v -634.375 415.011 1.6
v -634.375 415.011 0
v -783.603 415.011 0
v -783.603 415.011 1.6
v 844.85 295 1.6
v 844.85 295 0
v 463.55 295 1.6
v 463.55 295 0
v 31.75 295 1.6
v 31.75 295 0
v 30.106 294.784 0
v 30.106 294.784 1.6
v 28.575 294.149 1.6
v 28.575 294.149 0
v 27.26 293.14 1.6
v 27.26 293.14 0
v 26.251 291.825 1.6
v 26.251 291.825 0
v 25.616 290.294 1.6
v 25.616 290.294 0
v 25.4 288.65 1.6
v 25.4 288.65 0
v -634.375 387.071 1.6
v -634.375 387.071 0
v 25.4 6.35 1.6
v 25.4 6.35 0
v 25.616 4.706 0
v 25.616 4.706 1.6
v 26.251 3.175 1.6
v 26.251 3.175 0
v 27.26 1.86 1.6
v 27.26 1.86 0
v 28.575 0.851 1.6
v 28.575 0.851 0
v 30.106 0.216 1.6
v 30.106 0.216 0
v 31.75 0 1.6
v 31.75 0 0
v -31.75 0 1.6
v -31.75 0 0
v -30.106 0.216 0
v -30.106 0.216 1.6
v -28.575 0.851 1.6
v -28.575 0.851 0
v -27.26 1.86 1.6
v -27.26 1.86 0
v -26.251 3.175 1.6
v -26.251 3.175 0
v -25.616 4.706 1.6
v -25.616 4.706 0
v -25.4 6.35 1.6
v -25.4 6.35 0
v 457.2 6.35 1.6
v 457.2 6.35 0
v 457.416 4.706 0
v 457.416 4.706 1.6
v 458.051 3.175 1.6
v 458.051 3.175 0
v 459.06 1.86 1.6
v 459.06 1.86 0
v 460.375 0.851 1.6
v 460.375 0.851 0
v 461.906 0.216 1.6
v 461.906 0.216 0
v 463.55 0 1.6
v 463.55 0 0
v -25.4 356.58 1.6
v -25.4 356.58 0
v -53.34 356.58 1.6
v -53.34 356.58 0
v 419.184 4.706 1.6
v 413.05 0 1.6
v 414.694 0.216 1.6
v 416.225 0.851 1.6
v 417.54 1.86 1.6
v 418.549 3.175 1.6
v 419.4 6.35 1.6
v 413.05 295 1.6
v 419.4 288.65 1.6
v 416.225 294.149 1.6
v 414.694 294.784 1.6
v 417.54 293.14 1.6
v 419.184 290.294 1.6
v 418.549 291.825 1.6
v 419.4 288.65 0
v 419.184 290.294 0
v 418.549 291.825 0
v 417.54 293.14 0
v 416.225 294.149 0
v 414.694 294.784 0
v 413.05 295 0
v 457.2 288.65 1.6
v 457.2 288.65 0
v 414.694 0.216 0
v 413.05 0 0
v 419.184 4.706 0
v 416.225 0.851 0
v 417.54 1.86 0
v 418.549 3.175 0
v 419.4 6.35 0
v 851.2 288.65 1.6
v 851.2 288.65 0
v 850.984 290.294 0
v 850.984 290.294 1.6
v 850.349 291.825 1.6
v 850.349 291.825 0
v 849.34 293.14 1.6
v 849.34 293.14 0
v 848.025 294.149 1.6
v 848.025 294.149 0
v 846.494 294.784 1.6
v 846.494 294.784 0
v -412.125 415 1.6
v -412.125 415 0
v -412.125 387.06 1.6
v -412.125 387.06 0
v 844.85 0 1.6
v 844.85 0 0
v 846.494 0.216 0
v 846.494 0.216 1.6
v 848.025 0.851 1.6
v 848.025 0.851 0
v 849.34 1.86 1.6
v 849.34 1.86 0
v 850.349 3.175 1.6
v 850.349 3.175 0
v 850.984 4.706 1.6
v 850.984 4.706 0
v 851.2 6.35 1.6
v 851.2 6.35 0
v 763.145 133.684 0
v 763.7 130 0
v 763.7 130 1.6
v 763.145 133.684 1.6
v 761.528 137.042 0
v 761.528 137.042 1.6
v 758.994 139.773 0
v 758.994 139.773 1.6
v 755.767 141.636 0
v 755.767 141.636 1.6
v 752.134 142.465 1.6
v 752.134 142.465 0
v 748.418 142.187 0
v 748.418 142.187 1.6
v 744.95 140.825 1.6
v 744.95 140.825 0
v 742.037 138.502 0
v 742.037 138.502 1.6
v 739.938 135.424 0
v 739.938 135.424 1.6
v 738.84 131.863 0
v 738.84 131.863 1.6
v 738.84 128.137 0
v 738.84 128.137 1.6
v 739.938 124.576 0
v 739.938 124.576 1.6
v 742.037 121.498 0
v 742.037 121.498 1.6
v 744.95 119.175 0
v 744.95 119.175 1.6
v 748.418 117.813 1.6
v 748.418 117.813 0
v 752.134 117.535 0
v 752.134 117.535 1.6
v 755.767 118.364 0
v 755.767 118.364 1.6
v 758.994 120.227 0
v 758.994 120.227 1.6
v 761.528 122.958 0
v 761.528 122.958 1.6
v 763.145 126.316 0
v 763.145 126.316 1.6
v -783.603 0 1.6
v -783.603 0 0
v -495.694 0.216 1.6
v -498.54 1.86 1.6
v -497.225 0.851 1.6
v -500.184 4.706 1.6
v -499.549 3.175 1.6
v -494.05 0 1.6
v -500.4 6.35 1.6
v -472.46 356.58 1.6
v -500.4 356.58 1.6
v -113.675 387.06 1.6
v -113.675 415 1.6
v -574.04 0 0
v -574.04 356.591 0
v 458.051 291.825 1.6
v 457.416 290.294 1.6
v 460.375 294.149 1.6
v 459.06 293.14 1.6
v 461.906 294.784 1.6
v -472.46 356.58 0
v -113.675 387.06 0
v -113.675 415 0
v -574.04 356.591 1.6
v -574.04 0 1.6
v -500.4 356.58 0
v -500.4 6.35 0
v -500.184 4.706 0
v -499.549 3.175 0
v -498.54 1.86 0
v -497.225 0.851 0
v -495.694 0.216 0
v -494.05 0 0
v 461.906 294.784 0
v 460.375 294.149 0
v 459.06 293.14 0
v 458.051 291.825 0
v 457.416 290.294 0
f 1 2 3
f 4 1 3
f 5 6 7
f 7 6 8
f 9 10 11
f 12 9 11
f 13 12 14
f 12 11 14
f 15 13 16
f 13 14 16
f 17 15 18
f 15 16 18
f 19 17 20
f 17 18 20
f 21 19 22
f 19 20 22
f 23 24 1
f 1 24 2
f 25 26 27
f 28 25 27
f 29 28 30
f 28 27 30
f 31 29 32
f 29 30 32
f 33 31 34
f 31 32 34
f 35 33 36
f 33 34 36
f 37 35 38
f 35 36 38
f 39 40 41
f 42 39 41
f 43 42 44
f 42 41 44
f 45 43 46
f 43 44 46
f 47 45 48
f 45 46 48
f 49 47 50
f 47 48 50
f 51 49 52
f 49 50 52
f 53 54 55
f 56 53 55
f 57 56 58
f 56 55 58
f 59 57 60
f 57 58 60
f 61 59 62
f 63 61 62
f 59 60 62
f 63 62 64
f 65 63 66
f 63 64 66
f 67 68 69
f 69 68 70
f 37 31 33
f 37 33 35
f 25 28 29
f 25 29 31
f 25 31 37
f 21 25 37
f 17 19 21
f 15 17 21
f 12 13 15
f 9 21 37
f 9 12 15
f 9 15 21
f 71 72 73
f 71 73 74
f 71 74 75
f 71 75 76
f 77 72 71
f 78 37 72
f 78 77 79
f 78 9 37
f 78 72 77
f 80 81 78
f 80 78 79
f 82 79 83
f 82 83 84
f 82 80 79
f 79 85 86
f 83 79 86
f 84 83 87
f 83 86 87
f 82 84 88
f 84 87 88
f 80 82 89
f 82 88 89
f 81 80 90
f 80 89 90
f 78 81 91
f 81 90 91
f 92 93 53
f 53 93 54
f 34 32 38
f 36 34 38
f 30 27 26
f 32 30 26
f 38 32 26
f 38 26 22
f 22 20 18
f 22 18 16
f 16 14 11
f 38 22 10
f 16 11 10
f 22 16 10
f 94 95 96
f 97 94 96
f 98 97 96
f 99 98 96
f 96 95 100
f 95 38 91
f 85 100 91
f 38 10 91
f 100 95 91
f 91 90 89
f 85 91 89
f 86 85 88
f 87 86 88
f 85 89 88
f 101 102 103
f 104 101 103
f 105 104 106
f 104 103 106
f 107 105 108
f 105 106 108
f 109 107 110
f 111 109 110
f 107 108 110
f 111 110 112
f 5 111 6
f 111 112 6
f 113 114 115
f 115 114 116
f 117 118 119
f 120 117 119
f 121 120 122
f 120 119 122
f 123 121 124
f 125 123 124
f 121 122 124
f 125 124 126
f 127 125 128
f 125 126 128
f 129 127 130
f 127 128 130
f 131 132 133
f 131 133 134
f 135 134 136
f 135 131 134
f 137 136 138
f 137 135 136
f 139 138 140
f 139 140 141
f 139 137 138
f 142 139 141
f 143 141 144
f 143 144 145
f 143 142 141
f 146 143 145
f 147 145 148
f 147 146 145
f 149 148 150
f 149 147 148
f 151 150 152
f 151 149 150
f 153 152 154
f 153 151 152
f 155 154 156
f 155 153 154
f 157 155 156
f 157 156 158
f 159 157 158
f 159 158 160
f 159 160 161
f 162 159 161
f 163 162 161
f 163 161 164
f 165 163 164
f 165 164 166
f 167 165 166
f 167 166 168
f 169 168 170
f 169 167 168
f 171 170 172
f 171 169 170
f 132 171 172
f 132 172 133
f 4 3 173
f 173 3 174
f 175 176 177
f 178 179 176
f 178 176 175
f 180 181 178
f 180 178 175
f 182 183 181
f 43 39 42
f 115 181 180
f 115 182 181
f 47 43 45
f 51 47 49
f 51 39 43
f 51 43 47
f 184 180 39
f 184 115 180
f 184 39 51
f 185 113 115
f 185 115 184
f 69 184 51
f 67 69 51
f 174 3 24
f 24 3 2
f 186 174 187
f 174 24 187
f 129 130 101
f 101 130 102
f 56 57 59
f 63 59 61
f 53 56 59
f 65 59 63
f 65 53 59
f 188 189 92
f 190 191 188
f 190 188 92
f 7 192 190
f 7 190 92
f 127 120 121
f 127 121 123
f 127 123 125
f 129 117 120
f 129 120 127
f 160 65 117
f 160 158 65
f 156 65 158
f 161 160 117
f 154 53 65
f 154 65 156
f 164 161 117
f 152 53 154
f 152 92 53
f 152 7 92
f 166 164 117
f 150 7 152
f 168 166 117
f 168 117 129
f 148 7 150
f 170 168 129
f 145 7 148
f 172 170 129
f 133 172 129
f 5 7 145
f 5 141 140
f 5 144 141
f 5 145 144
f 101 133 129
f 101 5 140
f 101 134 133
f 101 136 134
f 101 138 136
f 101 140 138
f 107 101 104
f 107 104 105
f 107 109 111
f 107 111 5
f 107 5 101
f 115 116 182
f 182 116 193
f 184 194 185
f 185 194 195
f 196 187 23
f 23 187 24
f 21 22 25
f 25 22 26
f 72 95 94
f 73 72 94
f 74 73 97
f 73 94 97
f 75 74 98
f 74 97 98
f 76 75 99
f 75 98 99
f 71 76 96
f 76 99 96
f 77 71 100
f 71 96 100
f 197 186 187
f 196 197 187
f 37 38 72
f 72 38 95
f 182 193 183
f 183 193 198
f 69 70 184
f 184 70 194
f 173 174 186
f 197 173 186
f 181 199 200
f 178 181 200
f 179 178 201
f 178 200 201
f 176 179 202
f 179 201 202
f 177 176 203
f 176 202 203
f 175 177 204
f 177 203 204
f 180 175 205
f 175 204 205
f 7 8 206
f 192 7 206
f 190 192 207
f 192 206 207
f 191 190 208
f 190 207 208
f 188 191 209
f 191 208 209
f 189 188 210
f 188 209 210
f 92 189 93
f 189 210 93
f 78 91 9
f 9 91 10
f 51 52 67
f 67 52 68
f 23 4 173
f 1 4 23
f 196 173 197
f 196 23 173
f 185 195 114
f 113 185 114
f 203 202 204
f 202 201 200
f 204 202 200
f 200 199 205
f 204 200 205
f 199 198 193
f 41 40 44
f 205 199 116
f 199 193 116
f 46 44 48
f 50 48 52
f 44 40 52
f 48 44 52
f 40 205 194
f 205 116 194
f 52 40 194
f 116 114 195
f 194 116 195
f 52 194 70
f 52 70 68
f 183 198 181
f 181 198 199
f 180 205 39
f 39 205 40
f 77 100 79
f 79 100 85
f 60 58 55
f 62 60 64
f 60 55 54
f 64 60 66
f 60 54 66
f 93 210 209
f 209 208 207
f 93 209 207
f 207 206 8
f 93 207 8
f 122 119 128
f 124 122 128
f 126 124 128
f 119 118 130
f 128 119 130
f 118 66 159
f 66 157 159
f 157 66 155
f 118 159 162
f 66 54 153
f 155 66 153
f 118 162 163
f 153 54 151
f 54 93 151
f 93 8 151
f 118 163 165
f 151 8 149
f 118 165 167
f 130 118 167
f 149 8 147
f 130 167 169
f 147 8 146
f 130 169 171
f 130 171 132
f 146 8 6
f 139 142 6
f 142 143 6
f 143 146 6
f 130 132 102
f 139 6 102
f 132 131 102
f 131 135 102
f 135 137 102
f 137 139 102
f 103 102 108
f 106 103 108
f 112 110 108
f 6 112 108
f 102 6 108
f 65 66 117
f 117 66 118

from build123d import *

# Parameters (mm, degrees)
F0_R     = 12.5
F1_DEPTH = 1.6002


with BuildPart() as f1:
    # F0 (on Top) → F1 (new body)
    with BuildSketch(Plane.XY):
        with BuildLine():
            ThreePointArc((419.4, 288.65), (417.540128, 293.140128), (413.05, 295))
            Line((413.05, 295), (31.75, 295))
            ThreePointArc((31.75, 295), (27.259872, 293.140128), (25.4, 288.65))
            Line((25.4, 288.65), (25.4, 6.35))
            ThreePointArc((25.4, 6.35), (27.259872, 1.859872), (31.75, 0))
            Line((31.75, 0), (413.05, 0))
            ThreePointArc((413.05, 0), (417.540128, 1.859872), (419.4, 6.35))
            Line((419.4, 6.35), (419.4, 288.65))
        make_face()
        with BuildLine():
            ThreePointArc((457.2, 6.35), (459.059872, 1.859872), (463.55, 0))
            Line((463.55, 0), (844.85, 0))
            ThreePointArc((844.85, 0), (849.340128, 1.859872), (851.2, 6.35))
            Line((851.2, 6.35), (851.2, 288.65))
            ThreePointArc((851.2, 288.65), (849.340128, 293.140128), (844.85, 295))
            Line((844.85, 295), (463.55, 295))
            ThreePointArc((463.55, 295), (459.059872, 293.140128), (457.2, 288.65))
            Line((457.2, 288.65), (457.2, 6.35))
        make_face()
        with Locations((751.2, 130)):
            Circle(F0_R, mode=Mode.SUBTRACT)
        with BuildLine():
            Line((-494.05, 0), (-31.75, 0))
            ThreePointArc((-31.75, 0), (-27.259872, 1.859872), (-25.4, 6.35))
            Line((-25.4, 6.35), (-25.4, 356.58))
            Line((-25.4, 356.58), (-53.34, 356.58))
            Line((-53.34, 356.58), (-113.675, 387.06))
            Line((-113.675, 387.06), (-113.675, 415))
            Line((-113.675, 415), (-412.125, 415))
            Line((-412.125, 415), (-412.125, 387.06))
            Line((-412.125, 387.06), (-472.46, 356.58))
            Line((-472.46, 356.58), (-500.4, 356.58))
            Line((-500.4, 356.58), (-500.4, 6.35))
            ThreePointArc((-500.4, 6.35), (-498.540128, 1.859872), (-494.05, 0))
        make_face()
        Polygon((-783.6027, 0), (-574.04, 0), (-574.04, 356.5906), (-634.375, 387.0706), (-634.375, 415.0106), (-783.6027, 415.0106), align=None)
    extrude(amount=F1_DEPTH)


solid = f1.part
